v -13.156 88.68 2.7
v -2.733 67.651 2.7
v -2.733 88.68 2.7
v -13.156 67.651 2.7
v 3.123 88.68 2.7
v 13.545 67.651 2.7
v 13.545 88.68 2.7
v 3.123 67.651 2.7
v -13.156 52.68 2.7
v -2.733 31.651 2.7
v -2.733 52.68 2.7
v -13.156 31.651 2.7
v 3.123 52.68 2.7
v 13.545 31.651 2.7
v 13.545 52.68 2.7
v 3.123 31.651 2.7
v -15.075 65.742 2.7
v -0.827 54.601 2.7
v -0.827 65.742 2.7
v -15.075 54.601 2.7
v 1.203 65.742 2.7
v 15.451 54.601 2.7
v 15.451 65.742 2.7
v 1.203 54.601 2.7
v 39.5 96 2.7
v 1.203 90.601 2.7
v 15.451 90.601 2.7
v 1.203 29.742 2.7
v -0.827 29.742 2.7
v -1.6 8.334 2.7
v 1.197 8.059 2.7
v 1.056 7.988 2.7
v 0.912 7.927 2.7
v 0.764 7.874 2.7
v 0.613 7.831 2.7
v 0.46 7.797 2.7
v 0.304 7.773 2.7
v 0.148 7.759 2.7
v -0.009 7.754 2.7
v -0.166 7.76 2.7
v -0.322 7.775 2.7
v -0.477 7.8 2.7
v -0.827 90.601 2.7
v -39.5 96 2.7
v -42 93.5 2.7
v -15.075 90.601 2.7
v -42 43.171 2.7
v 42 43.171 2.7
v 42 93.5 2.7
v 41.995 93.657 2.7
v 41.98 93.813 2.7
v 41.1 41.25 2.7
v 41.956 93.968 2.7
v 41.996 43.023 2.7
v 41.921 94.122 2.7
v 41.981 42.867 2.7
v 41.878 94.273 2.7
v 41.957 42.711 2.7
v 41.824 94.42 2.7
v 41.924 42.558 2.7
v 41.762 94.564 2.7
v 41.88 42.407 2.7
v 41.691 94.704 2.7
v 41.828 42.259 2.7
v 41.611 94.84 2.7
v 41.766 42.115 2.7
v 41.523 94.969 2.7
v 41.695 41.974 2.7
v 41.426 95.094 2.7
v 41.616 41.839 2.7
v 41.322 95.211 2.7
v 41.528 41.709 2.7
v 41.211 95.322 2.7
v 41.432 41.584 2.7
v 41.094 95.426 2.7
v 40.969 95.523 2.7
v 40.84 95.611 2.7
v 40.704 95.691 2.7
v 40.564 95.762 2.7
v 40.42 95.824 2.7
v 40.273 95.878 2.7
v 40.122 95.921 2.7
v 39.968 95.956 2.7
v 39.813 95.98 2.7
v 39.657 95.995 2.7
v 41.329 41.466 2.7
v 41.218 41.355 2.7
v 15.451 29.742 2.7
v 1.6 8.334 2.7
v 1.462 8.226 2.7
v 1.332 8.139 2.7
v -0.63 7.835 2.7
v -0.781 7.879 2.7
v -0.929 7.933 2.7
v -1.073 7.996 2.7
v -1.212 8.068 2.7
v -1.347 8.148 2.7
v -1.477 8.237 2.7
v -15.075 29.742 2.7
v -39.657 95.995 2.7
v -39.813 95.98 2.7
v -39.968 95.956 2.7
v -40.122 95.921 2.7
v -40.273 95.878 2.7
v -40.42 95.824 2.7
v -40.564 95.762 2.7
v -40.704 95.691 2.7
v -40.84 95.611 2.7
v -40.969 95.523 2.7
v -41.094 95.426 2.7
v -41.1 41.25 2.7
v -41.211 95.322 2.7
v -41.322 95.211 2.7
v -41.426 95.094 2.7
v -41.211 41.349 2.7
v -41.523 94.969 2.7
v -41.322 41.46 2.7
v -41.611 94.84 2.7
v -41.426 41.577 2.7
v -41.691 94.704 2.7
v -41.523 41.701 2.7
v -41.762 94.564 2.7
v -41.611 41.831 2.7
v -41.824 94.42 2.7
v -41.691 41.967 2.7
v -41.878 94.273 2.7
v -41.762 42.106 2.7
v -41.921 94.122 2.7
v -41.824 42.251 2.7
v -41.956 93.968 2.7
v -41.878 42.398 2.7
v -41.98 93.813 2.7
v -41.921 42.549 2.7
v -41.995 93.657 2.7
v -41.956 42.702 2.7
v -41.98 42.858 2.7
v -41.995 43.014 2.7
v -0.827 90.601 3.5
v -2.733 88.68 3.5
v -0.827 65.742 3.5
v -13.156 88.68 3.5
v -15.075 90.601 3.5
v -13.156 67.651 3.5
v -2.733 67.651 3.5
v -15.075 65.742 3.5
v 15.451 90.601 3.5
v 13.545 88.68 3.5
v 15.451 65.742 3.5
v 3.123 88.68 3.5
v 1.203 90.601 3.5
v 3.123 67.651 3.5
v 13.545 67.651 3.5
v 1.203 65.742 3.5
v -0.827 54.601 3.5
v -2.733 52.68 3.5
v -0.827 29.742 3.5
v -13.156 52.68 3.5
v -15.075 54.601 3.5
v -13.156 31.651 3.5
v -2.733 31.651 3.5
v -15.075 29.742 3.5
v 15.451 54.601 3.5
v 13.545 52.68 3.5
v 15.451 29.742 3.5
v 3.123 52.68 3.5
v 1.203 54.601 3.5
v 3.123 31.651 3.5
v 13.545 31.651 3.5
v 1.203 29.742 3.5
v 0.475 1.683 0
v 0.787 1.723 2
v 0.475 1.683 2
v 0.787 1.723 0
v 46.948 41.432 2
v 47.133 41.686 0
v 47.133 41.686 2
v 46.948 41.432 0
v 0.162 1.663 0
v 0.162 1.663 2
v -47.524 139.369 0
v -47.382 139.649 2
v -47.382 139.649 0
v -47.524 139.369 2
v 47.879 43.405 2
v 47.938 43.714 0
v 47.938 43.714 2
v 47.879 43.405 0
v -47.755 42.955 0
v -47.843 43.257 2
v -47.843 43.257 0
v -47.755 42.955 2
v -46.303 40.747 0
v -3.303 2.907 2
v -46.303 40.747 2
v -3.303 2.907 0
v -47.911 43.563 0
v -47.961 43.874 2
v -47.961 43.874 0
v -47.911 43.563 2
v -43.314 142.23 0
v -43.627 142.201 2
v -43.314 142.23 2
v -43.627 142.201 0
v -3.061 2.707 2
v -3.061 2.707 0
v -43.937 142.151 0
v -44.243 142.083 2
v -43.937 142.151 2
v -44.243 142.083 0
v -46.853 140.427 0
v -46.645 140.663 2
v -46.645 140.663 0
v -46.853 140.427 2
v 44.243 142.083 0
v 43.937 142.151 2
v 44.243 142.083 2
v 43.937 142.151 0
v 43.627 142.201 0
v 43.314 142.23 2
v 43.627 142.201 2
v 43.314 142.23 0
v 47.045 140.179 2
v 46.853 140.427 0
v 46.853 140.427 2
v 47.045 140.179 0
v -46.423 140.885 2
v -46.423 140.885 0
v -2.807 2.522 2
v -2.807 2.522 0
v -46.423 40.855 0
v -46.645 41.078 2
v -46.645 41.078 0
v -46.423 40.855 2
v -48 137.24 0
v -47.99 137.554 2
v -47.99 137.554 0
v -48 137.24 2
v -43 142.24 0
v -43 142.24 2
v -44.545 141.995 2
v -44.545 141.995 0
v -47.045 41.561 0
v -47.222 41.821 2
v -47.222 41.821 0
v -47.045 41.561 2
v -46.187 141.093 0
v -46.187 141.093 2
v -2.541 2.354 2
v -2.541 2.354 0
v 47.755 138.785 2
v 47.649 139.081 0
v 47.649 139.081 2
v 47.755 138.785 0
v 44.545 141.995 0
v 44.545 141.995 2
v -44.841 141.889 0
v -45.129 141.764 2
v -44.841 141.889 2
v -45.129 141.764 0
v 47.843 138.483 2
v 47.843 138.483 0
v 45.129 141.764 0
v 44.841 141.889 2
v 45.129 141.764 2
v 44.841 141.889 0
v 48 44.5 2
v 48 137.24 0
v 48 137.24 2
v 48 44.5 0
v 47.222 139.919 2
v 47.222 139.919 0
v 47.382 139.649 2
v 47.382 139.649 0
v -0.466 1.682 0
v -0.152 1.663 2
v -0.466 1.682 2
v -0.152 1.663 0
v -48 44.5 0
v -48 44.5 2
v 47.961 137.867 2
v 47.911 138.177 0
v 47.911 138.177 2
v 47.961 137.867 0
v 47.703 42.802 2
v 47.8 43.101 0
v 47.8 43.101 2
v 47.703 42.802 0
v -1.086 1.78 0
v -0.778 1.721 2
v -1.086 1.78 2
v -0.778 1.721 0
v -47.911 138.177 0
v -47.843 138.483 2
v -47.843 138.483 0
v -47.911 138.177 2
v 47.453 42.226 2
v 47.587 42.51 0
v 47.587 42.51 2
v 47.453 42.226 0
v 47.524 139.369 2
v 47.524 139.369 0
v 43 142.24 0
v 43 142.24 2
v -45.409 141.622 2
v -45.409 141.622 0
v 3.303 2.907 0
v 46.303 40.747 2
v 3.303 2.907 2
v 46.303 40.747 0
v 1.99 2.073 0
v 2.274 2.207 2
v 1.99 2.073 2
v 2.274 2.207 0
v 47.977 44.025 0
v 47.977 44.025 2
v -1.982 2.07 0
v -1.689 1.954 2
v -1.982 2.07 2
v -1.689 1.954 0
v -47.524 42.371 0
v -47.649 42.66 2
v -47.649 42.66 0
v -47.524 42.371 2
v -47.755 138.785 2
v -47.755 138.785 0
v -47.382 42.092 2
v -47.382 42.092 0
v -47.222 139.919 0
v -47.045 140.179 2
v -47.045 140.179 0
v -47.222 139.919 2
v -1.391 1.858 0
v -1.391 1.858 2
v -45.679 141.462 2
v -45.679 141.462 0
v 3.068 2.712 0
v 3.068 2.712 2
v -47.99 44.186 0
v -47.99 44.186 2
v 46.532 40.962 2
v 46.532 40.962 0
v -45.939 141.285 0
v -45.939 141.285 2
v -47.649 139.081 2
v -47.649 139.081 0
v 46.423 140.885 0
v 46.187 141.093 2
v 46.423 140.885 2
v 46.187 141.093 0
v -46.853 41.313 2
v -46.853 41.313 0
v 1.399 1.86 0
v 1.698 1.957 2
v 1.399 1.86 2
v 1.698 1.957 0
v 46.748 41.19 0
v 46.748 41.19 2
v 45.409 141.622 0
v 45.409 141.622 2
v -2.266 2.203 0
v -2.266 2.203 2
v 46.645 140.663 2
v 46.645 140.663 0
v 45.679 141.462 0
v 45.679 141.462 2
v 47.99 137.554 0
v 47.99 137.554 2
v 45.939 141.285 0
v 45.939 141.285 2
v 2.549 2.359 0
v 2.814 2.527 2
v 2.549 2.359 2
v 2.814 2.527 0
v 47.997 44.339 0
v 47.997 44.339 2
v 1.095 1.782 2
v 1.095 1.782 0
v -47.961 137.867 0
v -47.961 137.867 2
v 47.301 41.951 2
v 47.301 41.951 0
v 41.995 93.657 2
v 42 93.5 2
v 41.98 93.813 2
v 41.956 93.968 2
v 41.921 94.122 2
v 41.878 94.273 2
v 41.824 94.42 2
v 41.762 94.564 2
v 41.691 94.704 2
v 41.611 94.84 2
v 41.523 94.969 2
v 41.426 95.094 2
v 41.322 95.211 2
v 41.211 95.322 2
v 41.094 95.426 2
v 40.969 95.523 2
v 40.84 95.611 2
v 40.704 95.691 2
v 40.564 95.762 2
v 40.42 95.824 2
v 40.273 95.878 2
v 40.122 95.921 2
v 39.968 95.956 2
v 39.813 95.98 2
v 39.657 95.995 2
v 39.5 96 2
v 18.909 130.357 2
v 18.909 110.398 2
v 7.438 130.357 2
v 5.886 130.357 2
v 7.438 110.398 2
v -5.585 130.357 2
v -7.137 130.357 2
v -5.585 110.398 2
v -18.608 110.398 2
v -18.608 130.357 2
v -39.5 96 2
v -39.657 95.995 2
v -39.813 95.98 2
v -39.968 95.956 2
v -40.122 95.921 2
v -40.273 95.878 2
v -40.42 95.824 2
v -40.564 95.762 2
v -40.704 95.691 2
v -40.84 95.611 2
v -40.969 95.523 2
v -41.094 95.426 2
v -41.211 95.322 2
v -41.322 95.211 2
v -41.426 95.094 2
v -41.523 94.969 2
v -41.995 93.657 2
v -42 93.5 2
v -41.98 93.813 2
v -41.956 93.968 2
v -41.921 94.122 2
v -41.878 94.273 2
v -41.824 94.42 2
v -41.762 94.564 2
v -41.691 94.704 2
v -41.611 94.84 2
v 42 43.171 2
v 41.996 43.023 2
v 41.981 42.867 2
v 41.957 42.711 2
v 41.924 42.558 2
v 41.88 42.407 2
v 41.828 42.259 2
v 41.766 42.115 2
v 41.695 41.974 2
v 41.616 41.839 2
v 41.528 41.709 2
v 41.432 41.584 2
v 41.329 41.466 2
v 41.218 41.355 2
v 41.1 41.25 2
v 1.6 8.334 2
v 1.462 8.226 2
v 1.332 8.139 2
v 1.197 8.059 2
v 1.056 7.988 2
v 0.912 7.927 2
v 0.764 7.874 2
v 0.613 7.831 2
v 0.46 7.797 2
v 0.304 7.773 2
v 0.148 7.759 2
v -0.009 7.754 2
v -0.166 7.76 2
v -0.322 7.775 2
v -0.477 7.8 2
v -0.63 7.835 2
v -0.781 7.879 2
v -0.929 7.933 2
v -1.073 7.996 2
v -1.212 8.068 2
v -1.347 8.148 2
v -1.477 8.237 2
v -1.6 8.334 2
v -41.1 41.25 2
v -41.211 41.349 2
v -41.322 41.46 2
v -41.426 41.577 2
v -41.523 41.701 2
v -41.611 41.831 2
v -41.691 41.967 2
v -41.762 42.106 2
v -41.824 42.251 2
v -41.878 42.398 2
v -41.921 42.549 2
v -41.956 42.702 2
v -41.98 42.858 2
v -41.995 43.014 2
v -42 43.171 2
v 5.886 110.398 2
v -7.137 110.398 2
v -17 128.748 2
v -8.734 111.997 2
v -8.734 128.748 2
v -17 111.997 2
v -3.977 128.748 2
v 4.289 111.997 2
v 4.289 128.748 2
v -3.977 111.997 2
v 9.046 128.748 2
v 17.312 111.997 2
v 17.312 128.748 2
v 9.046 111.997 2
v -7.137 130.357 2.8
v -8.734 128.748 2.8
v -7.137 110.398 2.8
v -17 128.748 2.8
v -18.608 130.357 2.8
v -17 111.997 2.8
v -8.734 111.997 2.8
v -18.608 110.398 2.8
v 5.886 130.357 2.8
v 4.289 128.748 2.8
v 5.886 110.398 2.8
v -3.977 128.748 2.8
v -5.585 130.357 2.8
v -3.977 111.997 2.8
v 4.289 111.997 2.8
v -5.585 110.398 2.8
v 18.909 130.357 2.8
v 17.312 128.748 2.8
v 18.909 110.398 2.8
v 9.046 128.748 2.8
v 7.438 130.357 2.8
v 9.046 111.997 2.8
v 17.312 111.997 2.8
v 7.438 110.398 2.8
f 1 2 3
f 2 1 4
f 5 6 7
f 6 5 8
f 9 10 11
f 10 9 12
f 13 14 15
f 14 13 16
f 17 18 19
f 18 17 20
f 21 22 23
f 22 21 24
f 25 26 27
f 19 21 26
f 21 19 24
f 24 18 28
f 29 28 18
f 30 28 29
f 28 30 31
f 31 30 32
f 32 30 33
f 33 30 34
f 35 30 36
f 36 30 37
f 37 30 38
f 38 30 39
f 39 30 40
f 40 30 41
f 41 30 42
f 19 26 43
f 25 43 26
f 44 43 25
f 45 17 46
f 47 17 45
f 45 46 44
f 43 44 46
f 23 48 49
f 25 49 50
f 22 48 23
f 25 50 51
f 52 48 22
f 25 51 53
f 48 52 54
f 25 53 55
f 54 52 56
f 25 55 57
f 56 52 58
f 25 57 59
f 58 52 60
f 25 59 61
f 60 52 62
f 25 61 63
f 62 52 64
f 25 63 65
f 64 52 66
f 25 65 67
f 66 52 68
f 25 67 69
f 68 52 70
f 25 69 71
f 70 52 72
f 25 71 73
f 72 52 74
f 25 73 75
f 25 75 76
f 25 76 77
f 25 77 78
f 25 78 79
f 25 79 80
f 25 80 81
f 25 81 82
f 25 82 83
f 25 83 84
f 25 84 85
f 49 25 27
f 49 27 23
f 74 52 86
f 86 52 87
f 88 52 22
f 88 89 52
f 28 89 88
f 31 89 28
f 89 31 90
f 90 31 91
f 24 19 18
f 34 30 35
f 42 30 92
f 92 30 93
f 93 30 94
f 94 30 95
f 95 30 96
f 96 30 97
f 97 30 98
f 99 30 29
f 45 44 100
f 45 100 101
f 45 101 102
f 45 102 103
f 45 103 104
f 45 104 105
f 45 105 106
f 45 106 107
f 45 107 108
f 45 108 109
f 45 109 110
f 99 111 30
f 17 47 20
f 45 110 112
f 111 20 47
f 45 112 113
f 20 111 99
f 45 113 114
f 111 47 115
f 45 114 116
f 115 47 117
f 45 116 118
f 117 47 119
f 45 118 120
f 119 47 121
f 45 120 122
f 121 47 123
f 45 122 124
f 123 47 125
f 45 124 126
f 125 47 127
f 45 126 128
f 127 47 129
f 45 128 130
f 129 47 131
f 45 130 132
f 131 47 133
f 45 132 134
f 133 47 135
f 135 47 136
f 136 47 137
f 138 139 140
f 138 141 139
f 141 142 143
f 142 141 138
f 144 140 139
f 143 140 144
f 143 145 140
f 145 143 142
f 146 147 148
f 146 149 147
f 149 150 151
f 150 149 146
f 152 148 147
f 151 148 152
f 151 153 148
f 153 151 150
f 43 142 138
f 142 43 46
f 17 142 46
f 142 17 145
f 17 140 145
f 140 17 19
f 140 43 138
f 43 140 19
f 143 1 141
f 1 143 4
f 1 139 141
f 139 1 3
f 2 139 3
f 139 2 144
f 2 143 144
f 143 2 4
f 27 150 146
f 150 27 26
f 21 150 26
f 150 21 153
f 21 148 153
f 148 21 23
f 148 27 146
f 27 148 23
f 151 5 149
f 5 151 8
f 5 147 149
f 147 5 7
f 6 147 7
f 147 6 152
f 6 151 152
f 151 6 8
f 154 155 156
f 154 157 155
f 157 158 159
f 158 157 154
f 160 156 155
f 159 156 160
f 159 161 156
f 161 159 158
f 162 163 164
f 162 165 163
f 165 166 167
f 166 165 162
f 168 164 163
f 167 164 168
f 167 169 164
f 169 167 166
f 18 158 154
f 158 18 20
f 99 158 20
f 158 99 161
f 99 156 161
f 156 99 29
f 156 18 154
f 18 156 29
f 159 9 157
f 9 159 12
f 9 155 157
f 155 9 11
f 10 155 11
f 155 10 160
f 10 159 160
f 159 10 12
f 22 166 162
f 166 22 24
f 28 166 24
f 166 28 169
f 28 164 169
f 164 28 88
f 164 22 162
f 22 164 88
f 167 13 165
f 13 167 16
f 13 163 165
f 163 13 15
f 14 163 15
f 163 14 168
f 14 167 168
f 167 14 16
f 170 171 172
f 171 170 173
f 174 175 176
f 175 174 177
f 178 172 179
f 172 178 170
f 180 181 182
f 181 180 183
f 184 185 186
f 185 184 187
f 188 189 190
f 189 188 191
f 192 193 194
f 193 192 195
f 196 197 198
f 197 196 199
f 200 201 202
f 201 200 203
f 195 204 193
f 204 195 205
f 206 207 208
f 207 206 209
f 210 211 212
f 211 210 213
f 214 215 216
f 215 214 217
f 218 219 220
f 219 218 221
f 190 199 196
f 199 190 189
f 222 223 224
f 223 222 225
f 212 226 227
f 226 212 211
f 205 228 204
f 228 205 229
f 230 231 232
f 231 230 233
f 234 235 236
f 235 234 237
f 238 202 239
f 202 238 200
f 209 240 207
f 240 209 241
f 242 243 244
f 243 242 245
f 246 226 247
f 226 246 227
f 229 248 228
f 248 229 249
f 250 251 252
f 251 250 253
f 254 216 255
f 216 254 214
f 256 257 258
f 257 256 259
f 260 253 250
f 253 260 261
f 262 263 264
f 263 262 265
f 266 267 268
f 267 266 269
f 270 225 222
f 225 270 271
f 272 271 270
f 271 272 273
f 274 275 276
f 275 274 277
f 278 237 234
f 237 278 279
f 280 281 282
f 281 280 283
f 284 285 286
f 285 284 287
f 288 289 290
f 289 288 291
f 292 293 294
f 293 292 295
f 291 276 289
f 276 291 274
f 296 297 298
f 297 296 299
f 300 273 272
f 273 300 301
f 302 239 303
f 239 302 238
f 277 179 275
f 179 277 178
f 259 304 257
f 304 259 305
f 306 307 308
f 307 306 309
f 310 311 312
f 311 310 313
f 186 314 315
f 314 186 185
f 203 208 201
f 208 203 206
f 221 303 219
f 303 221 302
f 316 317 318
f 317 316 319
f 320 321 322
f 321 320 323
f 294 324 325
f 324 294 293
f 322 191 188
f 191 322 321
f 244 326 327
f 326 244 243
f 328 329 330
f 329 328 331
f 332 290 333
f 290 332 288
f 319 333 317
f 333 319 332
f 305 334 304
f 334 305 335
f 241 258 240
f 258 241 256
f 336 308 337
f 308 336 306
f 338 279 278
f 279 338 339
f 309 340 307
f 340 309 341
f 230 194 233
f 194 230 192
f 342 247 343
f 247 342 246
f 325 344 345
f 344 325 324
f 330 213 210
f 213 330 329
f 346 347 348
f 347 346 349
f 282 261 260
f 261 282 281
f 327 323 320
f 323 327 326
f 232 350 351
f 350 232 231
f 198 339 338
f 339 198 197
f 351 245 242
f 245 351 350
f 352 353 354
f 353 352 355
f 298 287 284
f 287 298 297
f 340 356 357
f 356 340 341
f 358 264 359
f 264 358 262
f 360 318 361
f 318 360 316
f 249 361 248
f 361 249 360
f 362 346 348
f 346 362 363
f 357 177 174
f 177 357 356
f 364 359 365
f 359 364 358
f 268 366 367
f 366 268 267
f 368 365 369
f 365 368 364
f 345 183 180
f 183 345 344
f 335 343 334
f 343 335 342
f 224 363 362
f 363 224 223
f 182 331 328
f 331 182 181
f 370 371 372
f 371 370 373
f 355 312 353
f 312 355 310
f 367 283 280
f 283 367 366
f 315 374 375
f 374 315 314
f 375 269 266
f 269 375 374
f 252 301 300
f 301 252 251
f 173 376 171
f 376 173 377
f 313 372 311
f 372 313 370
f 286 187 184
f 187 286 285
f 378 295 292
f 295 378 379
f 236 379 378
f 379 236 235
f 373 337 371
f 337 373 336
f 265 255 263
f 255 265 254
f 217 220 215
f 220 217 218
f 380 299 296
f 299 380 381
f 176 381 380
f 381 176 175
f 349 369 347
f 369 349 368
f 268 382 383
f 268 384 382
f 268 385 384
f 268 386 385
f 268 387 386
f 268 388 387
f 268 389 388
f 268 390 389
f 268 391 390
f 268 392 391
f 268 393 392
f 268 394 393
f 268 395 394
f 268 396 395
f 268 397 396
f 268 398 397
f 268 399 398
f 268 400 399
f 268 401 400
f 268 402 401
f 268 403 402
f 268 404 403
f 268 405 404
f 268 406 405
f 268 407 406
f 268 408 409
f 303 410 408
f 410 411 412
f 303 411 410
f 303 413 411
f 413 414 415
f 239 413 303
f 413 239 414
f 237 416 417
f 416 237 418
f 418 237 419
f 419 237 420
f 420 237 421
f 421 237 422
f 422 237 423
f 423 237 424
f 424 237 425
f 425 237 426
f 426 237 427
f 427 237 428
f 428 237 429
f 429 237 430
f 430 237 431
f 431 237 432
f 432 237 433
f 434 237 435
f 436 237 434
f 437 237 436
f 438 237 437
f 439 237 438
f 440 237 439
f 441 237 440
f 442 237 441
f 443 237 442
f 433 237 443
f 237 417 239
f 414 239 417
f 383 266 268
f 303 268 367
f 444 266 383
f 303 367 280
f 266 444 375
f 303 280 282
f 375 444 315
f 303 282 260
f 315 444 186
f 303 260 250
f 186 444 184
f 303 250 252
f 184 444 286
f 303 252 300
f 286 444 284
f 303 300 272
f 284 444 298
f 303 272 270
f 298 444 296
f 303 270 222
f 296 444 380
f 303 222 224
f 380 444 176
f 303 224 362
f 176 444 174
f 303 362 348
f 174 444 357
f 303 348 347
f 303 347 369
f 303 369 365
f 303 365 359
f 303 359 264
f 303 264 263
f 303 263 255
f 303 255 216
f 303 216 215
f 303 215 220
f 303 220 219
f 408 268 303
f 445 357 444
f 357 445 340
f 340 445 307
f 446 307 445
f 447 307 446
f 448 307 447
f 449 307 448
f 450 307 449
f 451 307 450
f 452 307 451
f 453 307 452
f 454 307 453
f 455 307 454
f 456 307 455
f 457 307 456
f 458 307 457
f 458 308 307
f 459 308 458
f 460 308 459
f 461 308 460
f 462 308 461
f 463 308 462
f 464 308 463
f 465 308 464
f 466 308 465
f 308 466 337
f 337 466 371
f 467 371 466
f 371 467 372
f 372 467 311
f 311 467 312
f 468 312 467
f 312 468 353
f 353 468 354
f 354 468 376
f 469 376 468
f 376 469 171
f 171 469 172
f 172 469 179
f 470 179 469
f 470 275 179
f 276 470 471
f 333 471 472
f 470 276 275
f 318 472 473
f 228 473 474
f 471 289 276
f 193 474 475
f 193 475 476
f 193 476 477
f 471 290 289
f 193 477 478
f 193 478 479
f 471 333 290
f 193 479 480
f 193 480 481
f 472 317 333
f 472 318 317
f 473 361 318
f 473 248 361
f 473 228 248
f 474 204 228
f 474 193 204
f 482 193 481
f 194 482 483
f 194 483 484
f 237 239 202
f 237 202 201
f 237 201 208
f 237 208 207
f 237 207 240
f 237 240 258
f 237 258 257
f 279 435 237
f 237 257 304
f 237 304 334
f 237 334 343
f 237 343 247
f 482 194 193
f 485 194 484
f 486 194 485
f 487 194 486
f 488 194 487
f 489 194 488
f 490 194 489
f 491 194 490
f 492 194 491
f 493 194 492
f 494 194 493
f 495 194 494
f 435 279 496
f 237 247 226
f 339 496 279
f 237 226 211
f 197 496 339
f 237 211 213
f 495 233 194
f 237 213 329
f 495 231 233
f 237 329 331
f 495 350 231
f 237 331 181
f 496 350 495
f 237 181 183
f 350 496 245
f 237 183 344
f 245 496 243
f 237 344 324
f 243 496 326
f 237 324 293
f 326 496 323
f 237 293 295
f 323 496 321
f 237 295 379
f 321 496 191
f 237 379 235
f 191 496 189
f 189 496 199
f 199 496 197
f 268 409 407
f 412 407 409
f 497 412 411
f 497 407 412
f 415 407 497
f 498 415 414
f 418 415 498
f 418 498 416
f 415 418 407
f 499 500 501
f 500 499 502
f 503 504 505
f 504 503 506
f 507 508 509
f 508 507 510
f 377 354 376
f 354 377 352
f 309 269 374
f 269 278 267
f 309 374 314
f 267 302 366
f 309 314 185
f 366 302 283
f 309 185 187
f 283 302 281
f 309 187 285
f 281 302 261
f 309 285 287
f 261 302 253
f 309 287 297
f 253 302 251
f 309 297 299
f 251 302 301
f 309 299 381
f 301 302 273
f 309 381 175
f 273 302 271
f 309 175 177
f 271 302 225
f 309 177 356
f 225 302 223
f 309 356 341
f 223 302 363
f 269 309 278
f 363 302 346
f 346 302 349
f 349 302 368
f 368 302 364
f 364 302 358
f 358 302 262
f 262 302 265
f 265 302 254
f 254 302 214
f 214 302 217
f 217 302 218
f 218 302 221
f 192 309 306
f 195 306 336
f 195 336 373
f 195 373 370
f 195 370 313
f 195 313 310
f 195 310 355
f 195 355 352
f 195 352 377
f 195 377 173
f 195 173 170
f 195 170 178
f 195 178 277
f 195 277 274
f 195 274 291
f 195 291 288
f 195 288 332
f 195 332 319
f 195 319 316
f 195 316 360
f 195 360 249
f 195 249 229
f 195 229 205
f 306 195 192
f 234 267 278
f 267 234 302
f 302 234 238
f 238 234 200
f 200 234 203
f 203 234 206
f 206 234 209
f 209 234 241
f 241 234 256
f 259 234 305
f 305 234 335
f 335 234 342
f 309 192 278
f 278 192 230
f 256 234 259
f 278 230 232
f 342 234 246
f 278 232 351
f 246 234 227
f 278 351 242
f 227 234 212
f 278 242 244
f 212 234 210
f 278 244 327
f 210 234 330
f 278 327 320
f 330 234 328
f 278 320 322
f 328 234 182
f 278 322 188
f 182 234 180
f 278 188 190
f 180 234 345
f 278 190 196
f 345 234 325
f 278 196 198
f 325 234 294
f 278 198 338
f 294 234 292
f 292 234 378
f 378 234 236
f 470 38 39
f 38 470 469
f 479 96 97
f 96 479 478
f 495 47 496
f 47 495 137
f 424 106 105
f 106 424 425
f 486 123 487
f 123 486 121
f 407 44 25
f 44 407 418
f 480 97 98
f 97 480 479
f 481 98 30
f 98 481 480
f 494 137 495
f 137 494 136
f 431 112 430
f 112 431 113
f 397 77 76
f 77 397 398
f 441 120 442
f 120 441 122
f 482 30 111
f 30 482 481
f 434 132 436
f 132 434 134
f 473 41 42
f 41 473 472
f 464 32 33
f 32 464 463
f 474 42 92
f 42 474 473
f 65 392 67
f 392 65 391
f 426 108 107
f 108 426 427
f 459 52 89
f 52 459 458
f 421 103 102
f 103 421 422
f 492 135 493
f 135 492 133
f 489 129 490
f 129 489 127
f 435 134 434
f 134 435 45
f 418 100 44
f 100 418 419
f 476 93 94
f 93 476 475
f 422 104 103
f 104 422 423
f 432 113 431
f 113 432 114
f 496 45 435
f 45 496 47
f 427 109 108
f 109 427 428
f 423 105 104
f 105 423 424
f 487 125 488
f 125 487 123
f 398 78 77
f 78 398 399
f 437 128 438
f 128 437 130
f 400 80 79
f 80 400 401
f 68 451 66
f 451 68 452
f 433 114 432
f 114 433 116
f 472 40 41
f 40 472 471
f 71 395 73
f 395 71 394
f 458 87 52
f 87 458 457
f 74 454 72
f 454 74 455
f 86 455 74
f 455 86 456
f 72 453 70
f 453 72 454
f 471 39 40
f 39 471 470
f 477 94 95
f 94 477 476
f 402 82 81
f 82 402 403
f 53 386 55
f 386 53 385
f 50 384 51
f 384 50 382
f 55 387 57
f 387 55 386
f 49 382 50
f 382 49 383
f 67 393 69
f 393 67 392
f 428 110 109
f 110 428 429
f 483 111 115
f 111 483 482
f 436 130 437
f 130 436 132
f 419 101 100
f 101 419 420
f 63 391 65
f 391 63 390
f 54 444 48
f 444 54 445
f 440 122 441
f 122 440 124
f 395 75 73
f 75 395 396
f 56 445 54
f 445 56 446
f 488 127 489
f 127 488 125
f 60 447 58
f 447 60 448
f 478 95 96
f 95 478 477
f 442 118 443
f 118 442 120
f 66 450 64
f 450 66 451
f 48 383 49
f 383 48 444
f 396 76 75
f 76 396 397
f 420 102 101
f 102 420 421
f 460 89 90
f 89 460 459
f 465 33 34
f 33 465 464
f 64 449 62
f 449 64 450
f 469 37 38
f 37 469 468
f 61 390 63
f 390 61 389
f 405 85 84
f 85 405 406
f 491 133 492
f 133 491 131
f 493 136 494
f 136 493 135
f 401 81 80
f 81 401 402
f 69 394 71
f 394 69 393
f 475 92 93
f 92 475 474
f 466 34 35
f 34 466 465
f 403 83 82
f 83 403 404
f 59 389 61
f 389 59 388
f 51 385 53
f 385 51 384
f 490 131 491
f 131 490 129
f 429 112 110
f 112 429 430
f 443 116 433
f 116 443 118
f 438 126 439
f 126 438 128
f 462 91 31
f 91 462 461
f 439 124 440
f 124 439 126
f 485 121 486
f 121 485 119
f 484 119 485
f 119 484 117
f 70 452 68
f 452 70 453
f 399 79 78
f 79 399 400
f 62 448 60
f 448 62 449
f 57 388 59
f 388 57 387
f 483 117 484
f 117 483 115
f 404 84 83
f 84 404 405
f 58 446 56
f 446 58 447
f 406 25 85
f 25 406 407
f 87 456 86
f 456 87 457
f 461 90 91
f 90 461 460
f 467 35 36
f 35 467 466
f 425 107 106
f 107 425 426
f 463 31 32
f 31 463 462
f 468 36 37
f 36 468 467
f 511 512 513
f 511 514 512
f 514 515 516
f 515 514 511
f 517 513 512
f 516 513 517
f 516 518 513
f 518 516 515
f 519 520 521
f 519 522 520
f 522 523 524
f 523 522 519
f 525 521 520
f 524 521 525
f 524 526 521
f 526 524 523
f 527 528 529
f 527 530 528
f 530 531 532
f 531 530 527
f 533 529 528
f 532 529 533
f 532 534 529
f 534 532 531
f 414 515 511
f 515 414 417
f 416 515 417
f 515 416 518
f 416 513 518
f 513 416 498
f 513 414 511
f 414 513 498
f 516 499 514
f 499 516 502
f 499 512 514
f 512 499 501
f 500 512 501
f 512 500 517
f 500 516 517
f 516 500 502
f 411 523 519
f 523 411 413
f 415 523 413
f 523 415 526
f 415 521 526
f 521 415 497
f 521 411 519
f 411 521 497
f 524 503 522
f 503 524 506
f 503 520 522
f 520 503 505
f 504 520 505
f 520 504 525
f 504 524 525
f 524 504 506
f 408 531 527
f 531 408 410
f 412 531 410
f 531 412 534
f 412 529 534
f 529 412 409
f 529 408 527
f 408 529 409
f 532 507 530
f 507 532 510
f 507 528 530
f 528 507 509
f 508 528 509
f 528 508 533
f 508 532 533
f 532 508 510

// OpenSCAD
/* [文字设置] */
// 上方可自定义文字。
top_text = "梁周线";
// 下方文字第一行。
lower_text_line_1 = "此生";
// 下方文字第二行。
lower_text_line_2 = "必驾";
// Windows 常见中文字体；如文字无法显示，可改成系统中已有的字体。
font_name = "Microsoft YaHei:style=Bold";
top_text_size = 16; // [10:0.5:20]
lower_text_size = 20; // [16:0.5:24]
// 金色主牌底板的厚度，单位毫米。
model_thickness = 2.0; // [1:0.2:5]
// 上方文字和下方文字的凸起厚度，单位毫米。
text_thickness = 0.8; // [0.2:0.1:2]

/* [Hidden] */
part = "all";
$fn = 100;

sign_width = 96;
rectangle_height = 100;
triangle_height_ratio = 0.44;
base_thickness = model_thickness;
lower_panel_thickness = 0.7;
outer_corner_radius = 5;
border_width = 5.2;
lower_panel_width = 84;
lower_panel_top_y = 96;
lower_panel_tip_y = 7;
lower_panel_triangle_height = 35;
lower_panel_corner_radius = 2.5;
lower_text_line_gap = lower_text_size * 1.8;
text_stroke = 0.18;

triangle_height = sign_width * triangle_height_ratio;
shield_height = rectangle_height + triangle_height;

gold_color = [0.78, 0.54, 0.22];
dark_color = [0.07, 0.08, 0.08];
top_text_color = dark_color;
lower_text_color = gold_color;

module rounded_polygon(points, radius) {
  offset(r = radius) {
    offset(delta = -radius) {
      polygon(points);
    }
  }
}

module shield_2d(width, rect_height, tri_height, radius) {
  safe_radius = min(radius, width / 10, rect_height / 3, tri_height / 4);
  rounded_polygon(
    [
      [-width / 2, tri_height],
      [-width / 2, tri_height + rect_height],
      [width / 2, tri_height + rect_height],
      [width / 2, tri_height],
      [0, 0]
    ],
    safe_radius
  );
}

module lower_panel_2d() {
  panel_rect_height = max(1, lower_panel_top_y - lower_panel_tip_y - lower_panel_triangle_height);
  translate([0, lower_panel_tip_y]) {
    shield_2d(
      lower_panel_width,
      panel_rect_height,
      lower_panel_triangle_height,
      lower_panel_corner_radius
    );
  }
}

module raised_text(label, size, height) {
  linear_extrude(height = height) {
    offset(delta = text_stroke) {
      text(label, size = size, font = font_name, halign = "center", valign = "center");
    }
  }
}

module gold_base() {
  color(gold_color) {
    linear_extrude(height = base_thickness) {
      shield_2d(sign_width, rectangle_height, triangle_height, outer_corner_radius);
    }
  }
}

module lower_dark_panel() {
  color(dark_color) {
    translate([0, 0, base_thickness]) {
      linear_extrude(height = lower_panel_thickness) {
        lower_panel_2d();
      }
    }
  }
}

module top_text_model() {
  title_y = triangle_height + rectangle_height * 0.78;
  color(top_text_color) {
    translate([0, title_y, base_thickness]) {
      raised_text(top_text, top_text_size, text_thickness);
    }
  }
}

module lower_text_model() {
  block_center_y = lower_panel_tip_y + lower_panel_triangle_height + 18;
  text_z = base_thickness + lower_panel_thickness;

  color(lower_text_color) {
    translate([0, block_center_y + lower_text_line_gap / 2, text_z]) {
      raised_text(lower_text_line_1, lower_text_size, text_thickness);
    }

    translate([0, block_center_y - lower_text_line_gap / 2, text_z]) {
      raised_text(lower_text_line_2, lower_text_size, text_thickness);
    }
  }
}

module selected_part() {
  if (part == "all") {
    gold_base();
    lower_dark_panel();
    top_text_model();
    lower_text_model();
  }

  if (part == "gold_base") {
    gold_base();
  }

  if (part == "lower_dark_panel") {
    lower_dark_panel();
  }

  if (part == "top_text") {
    top_text_model();
  }

  if (part == "lower_text") {
    lower_text_model();
  }
}

selected_part();
